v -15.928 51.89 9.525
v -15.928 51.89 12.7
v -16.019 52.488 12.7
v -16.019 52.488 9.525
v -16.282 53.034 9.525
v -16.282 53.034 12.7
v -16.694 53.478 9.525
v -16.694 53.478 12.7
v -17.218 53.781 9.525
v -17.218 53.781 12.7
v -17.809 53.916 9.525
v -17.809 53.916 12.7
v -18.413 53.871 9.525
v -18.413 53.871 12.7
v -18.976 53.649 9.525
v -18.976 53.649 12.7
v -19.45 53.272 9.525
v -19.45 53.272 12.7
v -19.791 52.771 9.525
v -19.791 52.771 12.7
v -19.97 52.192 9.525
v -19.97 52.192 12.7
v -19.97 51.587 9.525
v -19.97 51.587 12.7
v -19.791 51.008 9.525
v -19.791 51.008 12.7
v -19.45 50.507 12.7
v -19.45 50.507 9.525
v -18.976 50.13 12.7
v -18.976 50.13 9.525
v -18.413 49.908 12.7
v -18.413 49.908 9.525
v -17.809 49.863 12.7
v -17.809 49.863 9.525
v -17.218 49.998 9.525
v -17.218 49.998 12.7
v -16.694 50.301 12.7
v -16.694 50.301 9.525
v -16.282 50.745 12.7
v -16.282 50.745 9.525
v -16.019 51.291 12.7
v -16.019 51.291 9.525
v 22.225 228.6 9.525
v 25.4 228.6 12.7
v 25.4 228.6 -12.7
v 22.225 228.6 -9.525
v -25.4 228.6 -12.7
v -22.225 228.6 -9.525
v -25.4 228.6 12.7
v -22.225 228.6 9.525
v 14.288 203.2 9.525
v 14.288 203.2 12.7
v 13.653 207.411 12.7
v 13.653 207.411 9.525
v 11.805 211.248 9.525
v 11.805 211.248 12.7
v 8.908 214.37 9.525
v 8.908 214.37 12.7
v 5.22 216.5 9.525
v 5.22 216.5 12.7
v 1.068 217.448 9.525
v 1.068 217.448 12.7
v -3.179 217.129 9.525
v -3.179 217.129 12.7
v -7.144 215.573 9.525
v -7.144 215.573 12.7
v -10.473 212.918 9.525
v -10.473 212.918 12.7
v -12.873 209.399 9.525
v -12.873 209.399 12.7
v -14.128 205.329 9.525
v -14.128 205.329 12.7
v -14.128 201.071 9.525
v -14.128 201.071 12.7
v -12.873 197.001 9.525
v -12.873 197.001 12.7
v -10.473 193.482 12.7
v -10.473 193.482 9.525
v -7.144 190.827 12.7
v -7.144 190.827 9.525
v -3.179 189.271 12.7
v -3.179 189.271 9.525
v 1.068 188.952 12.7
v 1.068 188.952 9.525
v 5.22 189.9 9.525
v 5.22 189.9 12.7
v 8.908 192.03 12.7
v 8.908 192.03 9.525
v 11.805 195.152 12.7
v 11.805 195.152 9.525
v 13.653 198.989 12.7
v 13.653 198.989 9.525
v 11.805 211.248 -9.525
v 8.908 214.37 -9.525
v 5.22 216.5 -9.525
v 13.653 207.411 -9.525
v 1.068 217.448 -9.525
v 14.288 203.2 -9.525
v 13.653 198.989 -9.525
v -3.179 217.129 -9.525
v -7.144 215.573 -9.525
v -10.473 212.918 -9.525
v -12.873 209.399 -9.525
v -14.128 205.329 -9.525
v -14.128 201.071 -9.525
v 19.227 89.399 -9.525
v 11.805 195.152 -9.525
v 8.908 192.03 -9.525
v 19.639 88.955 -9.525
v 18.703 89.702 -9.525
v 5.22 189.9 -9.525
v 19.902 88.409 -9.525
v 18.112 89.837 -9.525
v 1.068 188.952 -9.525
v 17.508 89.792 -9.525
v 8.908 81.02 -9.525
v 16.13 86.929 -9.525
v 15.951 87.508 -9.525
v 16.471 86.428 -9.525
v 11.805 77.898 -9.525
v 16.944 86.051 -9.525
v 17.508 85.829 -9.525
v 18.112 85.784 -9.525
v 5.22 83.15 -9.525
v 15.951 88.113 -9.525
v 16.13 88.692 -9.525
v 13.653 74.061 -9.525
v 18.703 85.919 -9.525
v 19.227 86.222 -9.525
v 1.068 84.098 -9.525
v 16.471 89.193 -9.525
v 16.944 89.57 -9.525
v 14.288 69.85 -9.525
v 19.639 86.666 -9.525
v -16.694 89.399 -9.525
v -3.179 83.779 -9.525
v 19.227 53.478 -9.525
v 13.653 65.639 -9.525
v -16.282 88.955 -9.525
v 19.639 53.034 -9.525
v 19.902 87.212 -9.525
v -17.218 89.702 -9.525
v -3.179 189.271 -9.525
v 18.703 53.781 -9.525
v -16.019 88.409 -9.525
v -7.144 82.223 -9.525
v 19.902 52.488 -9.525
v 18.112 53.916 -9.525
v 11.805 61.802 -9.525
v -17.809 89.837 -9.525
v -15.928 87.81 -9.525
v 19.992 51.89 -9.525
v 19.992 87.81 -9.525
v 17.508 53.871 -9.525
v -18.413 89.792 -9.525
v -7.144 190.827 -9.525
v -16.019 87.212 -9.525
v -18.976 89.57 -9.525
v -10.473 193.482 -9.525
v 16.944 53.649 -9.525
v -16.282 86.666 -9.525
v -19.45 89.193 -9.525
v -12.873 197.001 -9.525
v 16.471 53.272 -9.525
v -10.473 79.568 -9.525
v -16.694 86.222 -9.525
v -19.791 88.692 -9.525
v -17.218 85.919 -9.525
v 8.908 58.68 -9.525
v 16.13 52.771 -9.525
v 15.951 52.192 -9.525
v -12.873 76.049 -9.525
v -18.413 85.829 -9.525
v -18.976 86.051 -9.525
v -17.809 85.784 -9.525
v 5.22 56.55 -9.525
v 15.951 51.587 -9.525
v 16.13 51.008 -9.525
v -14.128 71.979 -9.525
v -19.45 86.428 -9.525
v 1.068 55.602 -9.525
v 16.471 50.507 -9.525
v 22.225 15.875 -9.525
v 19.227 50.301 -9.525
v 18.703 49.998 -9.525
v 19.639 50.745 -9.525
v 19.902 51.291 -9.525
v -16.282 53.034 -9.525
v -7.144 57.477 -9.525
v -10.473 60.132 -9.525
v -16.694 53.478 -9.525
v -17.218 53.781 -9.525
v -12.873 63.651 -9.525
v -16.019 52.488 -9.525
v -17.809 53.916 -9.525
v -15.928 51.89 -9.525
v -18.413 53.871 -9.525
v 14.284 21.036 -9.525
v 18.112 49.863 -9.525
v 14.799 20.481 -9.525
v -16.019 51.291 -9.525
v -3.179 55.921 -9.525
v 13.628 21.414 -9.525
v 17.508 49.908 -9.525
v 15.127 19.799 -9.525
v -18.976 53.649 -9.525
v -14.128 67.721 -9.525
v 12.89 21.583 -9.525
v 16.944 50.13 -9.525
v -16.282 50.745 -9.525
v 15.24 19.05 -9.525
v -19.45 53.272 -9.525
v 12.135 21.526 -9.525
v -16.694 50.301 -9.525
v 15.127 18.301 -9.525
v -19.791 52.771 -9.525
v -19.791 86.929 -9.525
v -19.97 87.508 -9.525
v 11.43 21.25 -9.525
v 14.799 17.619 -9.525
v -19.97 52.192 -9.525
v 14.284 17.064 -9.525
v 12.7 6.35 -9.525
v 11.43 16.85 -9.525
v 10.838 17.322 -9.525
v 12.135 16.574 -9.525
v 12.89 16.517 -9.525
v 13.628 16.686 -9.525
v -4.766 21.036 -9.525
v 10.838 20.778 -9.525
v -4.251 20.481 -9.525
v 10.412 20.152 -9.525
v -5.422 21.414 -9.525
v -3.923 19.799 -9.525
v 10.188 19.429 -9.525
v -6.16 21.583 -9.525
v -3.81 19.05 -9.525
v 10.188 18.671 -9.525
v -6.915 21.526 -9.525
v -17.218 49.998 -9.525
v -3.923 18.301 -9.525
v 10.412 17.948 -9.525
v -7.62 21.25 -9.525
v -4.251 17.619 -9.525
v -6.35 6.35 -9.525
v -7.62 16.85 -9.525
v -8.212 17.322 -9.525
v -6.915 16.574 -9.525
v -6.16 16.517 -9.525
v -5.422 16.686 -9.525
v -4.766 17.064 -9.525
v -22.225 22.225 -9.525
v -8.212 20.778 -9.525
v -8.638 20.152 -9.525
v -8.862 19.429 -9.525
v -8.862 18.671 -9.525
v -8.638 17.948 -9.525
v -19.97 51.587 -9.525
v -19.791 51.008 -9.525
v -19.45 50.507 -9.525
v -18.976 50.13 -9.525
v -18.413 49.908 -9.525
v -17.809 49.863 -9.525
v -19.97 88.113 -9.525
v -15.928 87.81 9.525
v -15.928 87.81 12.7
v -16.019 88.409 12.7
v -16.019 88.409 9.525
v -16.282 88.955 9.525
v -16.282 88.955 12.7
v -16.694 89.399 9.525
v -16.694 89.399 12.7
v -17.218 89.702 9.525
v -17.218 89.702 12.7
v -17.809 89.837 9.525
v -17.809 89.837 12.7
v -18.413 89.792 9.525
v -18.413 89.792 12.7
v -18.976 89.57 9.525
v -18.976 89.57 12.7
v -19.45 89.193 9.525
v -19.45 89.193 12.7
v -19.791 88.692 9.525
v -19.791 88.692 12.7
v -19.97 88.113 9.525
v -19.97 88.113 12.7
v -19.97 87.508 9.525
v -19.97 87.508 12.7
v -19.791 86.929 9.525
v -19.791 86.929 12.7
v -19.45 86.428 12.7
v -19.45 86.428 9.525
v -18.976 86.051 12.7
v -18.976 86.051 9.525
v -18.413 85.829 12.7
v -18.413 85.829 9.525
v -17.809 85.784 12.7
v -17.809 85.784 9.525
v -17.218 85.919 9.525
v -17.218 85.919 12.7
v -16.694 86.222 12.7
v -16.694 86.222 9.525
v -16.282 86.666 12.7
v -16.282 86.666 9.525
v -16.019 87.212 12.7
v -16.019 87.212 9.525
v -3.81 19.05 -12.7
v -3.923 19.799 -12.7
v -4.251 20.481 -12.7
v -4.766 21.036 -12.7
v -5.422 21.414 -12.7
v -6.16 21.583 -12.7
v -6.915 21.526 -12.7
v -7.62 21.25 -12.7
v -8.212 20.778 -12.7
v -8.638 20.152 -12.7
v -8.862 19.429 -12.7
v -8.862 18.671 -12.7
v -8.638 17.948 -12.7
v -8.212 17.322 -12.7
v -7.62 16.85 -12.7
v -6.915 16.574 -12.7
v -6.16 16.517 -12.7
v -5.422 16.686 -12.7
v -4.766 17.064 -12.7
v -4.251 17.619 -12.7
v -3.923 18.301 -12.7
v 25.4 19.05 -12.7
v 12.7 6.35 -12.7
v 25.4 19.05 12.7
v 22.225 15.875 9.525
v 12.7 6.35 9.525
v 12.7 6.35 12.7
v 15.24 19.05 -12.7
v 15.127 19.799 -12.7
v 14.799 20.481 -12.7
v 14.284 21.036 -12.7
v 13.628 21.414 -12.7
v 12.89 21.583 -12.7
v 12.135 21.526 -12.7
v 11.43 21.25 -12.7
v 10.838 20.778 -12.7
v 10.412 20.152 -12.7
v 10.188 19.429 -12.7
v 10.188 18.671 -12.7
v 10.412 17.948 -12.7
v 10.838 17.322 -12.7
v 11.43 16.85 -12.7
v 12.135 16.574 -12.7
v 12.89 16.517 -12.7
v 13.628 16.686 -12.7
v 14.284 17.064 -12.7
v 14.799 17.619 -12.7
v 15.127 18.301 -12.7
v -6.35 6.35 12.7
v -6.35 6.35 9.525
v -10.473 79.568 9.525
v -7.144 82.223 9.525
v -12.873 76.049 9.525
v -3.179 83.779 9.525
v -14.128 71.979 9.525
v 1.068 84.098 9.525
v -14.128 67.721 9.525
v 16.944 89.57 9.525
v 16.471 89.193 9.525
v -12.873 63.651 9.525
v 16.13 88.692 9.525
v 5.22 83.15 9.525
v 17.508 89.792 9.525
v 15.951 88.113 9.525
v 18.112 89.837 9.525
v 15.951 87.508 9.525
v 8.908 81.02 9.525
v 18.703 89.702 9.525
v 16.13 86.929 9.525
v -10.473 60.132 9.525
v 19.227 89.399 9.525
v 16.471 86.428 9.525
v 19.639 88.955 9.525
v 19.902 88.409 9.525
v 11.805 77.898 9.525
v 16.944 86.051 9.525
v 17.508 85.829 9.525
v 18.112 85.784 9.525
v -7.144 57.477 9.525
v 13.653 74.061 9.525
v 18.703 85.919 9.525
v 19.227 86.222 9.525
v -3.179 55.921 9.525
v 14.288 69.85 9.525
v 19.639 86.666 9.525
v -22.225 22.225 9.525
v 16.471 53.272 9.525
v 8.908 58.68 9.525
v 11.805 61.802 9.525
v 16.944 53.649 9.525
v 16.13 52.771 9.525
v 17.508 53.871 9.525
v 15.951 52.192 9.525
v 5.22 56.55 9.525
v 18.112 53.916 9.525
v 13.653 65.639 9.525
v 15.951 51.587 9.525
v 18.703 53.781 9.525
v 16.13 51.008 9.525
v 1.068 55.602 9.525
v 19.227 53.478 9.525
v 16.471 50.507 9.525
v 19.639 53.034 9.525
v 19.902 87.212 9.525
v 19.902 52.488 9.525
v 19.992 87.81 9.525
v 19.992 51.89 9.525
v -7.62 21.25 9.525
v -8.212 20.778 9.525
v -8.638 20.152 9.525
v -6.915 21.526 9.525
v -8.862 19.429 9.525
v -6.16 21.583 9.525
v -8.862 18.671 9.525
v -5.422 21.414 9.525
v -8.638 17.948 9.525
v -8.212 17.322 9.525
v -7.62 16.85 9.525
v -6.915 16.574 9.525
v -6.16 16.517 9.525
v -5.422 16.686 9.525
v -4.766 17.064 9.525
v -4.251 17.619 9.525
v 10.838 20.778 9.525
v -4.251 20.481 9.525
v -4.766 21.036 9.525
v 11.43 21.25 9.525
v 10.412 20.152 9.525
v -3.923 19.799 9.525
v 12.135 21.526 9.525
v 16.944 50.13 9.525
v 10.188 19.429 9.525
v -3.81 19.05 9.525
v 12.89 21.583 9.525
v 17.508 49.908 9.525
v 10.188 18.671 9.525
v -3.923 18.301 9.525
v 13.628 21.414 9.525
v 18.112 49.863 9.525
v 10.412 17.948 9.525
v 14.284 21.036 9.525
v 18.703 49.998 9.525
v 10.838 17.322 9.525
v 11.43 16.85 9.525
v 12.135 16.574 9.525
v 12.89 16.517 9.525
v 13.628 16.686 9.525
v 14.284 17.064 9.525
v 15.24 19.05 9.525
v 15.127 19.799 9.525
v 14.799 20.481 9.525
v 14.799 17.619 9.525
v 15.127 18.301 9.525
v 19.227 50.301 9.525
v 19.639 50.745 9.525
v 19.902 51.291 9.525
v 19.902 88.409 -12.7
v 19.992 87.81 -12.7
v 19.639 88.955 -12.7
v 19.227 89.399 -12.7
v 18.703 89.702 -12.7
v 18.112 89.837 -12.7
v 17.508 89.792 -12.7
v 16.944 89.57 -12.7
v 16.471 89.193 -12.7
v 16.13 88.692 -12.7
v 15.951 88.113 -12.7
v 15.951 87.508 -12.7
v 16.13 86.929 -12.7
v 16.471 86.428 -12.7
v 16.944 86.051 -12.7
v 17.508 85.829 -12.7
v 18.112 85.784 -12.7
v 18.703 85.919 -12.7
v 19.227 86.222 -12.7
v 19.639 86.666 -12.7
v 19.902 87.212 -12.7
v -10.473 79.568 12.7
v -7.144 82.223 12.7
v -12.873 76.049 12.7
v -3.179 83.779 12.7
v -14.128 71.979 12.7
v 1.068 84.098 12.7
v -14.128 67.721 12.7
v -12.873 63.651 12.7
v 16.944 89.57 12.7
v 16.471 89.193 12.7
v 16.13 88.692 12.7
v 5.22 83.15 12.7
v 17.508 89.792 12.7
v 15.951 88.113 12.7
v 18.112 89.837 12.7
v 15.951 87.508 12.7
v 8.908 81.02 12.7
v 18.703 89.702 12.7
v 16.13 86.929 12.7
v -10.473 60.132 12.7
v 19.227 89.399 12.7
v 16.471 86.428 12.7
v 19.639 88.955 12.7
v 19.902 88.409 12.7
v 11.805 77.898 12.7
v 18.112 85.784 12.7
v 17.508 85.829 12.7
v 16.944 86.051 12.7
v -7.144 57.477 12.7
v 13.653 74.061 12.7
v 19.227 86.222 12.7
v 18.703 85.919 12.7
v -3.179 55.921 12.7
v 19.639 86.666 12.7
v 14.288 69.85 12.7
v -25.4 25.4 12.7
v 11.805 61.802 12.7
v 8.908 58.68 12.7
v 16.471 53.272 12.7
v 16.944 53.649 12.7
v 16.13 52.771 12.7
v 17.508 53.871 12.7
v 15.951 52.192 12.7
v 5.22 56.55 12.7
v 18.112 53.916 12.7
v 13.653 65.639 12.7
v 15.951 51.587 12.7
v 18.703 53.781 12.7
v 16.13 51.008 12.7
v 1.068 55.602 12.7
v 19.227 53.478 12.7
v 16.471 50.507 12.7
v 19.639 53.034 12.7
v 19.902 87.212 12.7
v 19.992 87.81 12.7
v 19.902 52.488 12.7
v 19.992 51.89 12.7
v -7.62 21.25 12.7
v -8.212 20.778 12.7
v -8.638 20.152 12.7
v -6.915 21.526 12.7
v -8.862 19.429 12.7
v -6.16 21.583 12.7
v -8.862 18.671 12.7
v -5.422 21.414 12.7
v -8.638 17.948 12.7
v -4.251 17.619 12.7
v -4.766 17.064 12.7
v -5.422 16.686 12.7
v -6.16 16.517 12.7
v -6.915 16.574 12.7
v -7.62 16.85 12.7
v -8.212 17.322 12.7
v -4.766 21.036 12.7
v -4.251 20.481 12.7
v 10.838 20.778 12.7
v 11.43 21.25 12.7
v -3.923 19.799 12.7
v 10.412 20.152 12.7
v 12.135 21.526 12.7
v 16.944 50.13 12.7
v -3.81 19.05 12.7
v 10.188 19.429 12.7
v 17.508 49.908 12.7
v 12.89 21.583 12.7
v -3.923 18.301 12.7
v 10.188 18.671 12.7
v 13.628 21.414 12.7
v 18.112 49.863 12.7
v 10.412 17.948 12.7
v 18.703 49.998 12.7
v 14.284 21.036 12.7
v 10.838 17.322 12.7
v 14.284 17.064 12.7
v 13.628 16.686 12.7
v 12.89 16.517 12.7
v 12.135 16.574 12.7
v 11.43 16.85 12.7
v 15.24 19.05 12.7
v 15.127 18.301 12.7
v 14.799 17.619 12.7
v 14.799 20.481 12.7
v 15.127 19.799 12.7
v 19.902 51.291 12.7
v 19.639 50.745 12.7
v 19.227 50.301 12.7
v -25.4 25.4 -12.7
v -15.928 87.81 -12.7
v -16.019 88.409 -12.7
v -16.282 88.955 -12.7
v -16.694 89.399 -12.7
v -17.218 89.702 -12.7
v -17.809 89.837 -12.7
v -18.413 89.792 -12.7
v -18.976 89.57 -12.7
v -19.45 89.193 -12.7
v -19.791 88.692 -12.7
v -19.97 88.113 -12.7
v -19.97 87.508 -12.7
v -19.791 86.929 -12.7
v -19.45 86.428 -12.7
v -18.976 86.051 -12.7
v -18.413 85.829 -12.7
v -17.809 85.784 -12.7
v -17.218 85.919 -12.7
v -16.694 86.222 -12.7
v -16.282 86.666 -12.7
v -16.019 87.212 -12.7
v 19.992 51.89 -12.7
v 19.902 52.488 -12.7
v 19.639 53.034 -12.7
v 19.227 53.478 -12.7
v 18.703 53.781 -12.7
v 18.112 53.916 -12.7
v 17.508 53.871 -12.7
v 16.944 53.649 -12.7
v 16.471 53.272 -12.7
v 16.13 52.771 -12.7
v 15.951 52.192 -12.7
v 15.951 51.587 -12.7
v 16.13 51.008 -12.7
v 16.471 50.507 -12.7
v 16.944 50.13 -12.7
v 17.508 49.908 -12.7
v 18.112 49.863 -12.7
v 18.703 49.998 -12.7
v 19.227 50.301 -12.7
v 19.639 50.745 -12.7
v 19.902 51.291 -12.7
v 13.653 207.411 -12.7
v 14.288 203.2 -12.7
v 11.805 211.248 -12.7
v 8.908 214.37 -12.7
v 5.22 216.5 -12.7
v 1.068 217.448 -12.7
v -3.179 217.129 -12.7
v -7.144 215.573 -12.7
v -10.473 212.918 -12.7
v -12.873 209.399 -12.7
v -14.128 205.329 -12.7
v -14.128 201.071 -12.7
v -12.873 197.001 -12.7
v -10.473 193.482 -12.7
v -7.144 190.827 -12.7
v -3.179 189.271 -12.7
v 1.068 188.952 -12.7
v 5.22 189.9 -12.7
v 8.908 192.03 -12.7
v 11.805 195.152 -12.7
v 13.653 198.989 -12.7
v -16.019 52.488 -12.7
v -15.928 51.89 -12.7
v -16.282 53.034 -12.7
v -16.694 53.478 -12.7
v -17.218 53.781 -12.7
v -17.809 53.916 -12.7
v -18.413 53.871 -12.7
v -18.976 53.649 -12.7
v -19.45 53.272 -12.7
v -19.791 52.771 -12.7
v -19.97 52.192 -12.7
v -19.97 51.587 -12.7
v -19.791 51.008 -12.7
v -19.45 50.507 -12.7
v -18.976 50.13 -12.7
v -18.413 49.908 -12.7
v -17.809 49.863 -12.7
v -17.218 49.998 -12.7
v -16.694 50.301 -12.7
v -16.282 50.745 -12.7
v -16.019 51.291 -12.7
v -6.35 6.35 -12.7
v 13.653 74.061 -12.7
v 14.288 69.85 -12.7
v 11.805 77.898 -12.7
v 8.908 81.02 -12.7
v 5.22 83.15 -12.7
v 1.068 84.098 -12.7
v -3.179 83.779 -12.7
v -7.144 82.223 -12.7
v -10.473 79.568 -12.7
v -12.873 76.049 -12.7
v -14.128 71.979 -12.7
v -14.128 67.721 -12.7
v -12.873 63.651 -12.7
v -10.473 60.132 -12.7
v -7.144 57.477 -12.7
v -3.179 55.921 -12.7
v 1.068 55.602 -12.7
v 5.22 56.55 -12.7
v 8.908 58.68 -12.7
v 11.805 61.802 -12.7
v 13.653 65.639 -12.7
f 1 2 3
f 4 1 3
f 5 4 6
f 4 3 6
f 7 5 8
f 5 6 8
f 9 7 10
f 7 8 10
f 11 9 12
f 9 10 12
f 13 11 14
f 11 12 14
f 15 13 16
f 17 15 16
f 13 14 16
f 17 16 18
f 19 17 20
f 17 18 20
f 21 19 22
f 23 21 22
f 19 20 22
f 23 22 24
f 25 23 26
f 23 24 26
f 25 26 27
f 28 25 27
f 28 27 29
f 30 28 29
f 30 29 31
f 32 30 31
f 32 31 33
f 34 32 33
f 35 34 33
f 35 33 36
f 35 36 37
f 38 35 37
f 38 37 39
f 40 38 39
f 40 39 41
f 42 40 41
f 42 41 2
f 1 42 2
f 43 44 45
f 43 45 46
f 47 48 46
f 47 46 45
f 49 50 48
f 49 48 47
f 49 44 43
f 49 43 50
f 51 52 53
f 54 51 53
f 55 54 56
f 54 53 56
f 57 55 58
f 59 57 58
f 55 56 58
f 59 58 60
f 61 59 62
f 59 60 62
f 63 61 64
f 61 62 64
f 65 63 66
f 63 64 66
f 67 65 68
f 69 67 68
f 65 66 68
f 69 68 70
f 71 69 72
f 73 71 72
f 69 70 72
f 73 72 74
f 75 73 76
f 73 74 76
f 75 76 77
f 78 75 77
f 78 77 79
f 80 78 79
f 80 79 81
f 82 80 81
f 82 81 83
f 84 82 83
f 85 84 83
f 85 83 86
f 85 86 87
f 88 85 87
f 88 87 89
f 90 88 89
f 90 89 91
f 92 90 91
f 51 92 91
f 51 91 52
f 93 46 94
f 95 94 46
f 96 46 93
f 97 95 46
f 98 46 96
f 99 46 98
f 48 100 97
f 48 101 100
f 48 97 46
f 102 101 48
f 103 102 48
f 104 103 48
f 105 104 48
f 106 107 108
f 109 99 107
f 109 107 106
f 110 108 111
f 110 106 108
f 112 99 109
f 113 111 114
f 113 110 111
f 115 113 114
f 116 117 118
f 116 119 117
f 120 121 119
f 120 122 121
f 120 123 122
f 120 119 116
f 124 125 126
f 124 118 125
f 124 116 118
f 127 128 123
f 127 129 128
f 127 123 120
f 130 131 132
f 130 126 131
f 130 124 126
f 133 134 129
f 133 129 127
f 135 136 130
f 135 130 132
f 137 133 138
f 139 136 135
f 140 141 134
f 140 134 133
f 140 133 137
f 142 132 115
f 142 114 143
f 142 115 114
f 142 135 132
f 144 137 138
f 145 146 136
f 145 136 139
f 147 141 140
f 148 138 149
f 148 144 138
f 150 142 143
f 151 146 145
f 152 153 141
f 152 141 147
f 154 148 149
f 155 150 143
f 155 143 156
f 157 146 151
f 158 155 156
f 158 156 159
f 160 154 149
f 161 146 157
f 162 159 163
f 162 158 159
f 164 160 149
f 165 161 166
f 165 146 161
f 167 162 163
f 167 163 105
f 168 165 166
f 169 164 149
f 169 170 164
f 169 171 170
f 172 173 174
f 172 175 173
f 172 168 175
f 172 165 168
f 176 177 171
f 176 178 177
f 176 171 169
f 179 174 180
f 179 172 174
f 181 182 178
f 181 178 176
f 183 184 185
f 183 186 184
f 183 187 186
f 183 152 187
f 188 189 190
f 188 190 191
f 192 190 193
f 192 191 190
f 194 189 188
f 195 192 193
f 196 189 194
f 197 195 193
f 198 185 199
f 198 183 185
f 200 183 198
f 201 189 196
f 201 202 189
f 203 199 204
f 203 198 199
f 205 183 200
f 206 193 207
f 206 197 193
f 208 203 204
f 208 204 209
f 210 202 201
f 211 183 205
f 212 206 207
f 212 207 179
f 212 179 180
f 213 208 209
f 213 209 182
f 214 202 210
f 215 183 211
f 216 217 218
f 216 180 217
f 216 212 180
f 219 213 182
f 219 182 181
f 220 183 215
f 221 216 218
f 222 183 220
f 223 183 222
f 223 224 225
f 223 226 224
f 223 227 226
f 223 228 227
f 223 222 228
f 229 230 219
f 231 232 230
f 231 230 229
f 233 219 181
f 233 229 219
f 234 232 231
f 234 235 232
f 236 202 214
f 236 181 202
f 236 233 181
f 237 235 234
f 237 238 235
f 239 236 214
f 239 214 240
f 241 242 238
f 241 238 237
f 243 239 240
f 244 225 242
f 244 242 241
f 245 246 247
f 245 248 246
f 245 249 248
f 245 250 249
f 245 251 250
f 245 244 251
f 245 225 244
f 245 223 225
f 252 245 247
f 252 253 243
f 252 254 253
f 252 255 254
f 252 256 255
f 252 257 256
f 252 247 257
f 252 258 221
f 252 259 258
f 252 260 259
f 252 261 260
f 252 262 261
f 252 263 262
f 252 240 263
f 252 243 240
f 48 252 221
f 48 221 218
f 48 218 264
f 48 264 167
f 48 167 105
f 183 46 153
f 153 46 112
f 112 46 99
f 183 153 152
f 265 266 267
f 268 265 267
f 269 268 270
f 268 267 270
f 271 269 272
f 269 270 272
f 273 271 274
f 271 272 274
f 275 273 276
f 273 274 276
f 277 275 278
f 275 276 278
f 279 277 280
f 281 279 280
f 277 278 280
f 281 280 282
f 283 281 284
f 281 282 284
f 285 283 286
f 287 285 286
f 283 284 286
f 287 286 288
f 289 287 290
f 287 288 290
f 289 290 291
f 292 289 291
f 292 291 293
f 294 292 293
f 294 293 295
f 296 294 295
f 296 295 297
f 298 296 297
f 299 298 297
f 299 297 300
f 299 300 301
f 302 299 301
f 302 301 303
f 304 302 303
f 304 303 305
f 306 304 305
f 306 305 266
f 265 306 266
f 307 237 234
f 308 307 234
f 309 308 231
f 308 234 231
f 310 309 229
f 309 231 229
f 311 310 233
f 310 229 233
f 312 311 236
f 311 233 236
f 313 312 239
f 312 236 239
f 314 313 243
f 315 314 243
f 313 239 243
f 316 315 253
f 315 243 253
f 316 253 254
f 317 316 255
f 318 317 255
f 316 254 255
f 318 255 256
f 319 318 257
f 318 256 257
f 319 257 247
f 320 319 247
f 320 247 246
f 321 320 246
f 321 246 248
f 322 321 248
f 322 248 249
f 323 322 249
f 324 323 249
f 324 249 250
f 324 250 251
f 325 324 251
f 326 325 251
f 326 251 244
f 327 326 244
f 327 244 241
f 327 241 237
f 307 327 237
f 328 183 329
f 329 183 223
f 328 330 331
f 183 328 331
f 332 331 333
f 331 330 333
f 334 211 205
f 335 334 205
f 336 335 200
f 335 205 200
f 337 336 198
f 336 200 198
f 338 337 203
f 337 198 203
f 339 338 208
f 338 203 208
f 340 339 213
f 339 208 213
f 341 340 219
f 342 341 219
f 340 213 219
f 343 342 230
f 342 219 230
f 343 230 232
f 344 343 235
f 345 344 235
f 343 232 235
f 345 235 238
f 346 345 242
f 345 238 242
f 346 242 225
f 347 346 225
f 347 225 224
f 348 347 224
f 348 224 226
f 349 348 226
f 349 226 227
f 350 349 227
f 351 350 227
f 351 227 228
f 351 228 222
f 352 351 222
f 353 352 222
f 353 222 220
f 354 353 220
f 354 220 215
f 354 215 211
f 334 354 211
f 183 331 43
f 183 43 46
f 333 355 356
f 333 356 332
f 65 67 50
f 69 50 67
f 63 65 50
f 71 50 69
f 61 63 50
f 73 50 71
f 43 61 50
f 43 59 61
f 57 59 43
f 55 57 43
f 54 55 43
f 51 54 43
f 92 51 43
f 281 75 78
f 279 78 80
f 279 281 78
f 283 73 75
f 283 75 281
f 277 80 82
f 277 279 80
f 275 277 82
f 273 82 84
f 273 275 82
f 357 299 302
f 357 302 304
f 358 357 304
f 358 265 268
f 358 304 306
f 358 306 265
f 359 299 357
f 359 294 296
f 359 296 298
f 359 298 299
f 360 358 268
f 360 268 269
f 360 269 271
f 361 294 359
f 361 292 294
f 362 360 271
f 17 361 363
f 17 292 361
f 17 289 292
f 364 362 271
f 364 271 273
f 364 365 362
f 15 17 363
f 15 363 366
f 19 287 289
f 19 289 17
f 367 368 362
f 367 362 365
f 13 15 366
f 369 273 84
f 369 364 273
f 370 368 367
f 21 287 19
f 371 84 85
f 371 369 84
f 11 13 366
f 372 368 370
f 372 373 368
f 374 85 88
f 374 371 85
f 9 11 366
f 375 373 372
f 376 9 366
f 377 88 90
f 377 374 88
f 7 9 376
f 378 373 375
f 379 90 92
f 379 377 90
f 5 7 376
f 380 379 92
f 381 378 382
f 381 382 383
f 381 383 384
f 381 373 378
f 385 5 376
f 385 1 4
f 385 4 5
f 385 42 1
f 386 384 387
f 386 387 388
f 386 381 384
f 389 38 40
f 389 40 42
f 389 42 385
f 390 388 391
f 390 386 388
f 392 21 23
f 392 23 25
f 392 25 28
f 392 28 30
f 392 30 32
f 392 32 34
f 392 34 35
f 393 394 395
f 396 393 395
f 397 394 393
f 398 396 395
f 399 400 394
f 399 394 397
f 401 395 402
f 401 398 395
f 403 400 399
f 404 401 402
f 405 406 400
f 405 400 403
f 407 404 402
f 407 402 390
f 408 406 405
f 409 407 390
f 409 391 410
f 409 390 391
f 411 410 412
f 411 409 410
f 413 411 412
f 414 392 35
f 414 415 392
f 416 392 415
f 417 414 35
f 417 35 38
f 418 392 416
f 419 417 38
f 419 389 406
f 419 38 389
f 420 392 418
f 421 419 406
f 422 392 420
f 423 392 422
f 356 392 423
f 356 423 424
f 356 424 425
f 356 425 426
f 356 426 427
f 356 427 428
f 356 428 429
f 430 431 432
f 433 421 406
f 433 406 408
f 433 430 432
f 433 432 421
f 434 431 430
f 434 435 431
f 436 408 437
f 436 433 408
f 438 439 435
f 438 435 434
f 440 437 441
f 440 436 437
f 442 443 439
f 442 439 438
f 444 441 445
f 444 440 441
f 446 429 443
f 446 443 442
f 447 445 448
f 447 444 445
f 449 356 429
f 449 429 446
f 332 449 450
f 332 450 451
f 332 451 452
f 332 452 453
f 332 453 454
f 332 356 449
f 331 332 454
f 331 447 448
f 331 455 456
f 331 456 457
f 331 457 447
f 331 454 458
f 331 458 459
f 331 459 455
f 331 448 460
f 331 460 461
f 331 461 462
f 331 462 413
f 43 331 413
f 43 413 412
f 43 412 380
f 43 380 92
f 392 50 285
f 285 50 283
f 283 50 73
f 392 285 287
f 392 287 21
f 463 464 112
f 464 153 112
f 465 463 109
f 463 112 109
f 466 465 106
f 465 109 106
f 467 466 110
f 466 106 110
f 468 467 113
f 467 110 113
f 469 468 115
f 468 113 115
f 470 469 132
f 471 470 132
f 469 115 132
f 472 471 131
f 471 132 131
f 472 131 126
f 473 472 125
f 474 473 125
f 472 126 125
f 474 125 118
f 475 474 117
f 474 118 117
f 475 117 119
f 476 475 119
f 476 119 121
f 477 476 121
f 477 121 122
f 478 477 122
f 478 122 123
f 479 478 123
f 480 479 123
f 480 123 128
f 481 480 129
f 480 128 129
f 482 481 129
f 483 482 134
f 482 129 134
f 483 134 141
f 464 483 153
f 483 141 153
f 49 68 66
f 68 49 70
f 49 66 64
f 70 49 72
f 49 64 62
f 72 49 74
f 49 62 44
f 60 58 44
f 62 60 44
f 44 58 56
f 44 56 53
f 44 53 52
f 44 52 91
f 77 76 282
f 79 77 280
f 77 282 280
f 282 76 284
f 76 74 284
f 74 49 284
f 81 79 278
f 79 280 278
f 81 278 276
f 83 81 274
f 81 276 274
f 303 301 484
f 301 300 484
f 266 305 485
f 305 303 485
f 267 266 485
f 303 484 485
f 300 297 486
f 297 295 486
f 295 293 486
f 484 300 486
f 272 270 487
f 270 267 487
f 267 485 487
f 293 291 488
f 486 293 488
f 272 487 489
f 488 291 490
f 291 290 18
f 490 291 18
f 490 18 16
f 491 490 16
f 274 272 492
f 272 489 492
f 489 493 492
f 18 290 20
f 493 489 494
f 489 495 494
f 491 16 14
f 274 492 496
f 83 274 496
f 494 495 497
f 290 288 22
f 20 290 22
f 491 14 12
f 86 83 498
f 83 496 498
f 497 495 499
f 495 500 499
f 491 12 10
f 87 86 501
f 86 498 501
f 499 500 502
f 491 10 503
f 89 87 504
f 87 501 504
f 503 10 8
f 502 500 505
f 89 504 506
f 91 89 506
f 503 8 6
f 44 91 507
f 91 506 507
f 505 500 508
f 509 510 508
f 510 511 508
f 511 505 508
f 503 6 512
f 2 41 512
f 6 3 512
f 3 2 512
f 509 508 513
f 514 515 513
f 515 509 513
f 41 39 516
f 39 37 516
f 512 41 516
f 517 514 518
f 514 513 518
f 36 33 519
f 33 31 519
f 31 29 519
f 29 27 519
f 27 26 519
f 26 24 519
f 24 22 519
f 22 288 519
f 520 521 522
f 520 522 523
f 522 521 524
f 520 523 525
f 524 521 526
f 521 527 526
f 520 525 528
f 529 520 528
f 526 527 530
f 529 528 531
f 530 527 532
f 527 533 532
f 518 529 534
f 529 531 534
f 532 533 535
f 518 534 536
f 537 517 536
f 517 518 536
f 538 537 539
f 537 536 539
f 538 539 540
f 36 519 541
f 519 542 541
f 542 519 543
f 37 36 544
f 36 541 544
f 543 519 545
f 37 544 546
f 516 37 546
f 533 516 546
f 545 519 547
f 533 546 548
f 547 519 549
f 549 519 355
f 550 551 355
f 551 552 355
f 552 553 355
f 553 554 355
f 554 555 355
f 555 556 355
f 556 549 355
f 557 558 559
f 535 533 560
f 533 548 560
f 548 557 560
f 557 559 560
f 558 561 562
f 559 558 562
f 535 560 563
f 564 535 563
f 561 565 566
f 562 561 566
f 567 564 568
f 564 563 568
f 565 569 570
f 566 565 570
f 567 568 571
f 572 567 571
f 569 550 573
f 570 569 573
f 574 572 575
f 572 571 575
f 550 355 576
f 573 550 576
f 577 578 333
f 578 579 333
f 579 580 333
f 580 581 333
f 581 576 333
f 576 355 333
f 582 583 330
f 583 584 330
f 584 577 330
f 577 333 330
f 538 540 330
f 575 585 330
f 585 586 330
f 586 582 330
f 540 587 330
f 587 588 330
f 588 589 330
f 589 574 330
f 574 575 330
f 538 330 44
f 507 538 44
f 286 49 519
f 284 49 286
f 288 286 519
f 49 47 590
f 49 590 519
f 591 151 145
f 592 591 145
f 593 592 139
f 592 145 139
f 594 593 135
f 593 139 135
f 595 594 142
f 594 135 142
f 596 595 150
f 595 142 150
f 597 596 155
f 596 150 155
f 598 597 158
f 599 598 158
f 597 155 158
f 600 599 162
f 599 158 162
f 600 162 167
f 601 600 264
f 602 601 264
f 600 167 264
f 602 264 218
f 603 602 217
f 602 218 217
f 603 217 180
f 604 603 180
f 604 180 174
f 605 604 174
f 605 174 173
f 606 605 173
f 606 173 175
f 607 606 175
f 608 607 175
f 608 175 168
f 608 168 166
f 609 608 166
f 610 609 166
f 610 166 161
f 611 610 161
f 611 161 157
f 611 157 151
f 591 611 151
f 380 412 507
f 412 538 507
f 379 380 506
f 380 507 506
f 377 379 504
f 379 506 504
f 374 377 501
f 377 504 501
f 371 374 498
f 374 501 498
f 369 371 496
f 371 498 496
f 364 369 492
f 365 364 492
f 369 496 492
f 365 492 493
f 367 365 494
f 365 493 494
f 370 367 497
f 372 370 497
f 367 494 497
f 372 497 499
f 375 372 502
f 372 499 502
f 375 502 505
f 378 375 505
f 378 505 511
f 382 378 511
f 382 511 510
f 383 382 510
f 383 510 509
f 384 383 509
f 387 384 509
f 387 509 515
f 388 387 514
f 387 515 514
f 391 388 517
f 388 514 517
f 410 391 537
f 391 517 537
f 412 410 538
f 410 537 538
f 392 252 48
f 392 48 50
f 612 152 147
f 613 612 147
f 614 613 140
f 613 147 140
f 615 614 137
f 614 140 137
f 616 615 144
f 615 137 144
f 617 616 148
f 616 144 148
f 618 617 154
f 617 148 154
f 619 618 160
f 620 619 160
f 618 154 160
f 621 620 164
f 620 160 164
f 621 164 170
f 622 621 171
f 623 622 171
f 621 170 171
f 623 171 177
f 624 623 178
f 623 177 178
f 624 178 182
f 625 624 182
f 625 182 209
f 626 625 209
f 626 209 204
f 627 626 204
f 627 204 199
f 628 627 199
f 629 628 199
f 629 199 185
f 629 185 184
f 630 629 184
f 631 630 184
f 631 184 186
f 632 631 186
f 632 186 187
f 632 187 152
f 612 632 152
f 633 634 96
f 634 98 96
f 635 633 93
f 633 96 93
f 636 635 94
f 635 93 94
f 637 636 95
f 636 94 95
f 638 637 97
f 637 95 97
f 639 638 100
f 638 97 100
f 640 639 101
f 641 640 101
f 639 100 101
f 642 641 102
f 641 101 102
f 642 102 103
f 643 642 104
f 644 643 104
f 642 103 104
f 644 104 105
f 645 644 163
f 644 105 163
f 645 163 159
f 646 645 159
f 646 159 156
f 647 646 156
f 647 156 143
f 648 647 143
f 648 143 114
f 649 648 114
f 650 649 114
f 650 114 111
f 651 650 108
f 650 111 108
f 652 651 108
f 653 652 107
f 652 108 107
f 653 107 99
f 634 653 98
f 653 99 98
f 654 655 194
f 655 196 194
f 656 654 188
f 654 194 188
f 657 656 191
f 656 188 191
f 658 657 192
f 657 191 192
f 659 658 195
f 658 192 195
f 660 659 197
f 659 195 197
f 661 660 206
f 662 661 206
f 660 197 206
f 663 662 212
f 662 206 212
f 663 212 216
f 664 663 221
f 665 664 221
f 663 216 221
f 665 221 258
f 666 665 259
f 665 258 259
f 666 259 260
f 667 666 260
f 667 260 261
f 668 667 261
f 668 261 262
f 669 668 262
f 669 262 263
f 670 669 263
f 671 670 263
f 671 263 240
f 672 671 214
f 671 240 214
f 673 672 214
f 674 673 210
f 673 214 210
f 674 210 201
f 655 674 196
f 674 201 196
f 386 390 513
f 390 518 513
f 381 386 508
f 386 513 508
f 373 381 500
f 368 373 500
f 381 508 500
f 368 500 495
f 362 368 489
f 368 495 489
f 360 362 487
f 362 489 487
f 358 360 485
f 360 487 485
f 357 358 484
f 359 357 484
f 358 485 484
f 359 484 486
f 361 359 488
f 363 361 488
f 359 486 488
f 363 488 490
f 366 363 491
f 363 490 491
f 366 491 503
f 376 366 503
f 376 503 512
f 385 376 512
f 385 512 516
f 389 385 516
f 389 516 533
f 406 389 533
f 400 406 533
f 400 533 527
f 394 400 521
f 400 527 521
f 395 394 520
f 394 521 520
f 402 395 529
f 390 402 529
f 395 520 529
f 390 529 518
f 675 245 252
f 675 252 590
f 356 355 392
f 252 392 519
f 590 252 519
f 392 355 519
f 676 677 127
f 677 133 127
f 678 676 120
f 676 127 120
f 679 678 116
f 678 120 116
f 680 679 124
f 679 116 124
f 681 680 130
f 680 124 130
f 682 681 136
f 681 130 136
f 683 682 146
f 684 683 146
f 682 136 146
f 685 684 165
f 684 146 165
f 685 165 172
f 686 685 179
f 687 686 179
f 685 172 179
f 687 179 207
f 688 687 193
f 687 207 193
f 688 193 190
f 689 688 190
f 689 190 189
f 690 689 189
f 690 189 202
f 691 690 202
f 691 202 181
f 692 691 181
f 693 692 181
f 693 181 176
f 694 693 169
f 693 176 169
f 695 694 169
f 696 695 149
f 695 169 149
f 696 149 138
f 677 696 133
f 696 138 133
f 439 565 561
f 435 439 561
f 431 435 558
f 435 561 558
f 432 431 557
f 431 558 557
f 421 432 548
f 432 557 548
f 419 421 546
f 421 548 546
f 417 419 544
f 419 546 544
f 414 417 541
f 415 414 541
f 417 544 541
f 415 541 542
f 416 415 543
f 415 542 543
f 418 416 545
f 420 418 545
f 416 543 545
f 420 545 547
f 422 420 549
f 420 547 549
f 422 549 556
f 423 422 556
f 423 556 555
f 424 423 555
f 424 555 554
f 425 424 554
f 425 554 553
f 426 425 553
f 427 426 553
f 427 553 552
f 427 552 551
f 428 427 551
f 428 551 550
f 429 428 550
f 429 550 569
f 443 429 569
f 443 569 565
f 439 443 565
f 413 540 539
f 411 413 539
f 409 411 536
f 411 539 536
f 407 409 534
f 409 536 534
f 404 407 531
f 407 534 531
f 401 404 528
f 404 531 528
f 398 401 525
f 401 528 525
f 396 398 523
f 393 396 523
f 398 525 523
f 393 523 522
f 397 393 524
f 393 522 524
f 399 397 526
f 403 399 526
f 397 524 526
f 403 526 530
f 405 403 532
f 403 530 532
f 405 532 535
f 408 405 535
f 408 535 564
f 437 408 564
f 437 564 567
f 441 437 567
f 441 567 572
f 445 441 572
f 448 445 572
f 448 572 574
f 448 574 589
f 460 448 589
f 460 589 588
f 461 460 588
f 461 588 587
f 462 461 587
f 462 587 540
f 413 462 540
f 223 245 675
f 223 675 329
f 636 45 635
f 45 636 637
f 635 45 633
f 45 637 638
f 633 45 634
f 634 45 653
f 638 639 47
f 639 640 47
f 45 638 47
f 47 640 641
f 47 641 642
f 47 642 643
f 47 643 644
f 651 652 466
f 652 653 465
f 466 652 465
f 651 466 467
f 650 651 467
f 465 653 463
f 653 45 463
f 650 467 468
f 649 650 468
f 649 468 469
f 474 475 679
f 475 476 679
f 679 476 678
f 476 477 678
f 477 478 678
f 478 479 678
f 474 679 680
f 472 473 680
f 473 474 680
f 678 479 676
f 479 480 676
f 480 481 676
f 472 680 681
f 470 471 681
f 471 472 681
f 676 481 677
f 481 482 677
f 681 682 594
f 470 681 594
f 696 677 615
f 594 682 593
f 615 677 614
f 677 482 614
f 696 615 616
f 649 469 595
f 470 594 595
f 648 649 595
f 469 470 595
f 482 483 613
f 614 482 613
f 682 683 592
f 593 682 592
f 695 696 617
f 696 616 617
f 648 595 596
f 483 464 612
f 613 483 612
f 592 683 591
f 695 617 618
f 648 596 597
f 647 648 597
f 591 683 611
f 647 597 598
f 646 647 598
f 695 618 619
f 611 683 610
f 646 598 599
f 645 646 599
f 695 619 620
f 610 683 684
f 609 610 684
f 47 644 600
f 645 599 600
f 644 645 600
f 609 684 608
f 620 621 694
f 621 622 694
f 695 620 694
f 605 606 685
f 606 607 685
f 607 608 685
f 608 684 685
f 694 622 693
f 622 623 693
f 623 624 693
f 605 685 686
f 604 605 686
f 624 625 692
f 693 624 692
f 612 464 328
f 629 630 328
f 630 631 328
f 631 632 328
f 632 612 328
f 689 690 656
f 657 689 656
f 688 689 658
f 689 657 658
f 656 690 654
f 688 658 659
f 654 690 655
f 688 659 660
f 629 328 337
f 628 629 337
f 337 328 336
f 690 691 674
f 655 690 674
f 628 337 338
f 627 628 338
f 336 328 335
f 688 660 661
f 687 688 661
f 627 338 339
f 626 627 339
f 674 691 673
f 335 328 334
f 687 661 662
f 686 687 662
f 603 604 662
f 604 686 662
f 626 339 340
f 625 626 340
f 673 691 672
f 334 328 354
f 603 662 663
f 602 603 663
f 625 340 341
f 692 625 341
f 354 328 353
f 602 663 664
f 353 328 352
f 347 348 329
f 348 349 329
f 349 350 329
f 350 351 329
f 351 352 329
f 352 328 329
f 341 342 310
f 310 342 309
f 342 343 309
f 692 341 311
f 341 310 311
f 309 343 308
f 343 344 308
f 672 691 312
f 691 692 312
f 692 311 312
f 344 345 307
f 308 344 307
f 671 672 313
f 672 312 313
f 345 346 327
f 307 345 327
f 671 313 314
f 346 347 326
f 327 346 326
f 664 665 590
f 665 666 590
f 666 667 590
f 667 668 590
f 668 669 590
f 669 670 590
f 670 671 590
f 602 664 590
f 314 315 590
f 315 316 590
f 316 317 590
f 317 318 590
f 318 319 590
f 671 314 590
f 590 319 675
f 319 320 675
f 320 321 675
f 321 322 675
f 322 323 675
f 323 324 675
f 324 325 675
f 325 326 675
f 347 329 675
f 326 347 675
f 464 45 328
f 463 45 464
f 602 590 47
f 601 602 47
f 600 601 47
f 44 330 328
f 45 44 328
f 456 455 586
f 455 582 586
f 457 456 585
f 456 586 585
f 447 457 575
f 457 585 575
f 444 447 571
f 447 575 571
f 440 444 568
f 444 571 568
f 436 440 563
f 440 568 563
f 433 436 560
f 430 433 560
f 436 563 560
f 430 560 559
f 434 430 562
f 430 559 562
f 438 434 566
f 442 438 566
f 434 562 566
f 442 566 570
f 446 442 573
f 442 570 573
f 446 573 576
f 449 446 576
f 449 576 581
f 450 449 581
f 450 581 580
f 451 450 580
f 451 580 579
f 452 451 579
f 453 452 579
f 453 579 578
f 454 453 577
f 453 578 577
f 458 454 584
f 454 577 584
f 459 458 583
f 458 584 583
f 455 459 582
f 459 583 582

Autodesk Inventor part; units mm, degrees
ref_plane "YZ Plane" through (0, 0, 0) normal (1, 0, 0) x (0, 1, 0)
ref_plane "XZ Plane" through (0, 0, 0) normal (0, 1, 0) x (-1, 0, 0)
ref_plane "XY Plane" through (0, 0, 0) normal (0, 0, 1) x (1, 0, 0)
sketch "Sketch1" plane through (0, 0, 0) normal (0, 1, 0) x (-1, 0, 0)
  line L0 (25.4, 12.7) -> (-25.4, 12.7)
  line L1 (-25.4, 12.7) -> (-25.4, -12.7)
  line L2 (-25.4, -12.7) -> (25.4, -12.7)
  line L3 (25.4, -12.7) -> (25.4, 12.7)
  line L4 (25.4, 12.7) -> (-25.4, -12.7) construction
  line L5 (-25.4, 12.7) -> (25.4, -12.7) construction
  line L6 (22.225, 9.525) -> (-22.225, 9.525)
  line L7 (-22.225, 9.525) -> (-22.225, -9.525)
  line L8 (-22.225, -9.525) -> (22.225, -9.525)
  line L9 (22.225, -9.525) -> (22.225, 9.525)
  line L10 (22.225, 9.525) -> (-22.225, -9.525) construction
  line L11 (-22.225, 9.525) -> (22.225, -9.525) construction
  point P0 (0, 0)
  dimension "d0" = 50.8
  dimension "d1" = 25.4
  dimension "d2" = 44.45
  dimension "d3" = 19.05
extrude "Extrusion1" add sketch "Sketch1" along normal blind 228.6
sketch "Sketch2" plane through (-25.4, 0, 12.7) normal (0, 0, 1) x (1, 0, 0)
  line L0 (50.8, 0) -> (50.8, 228.6) projected
  line L1 (0, 228.6) -> (50.8, 228.6) projected
  line L2 (0, 0) -> (0, 228.6) projected
  line L3 (25.4, 228.6) -> (25.4, 203.2)
  circle A0 centre (25.4, 203.2) radius 6.35
  line L4 (25.4, 203.2) -> (25.4, 25.4)
  line L5 (25.4, 203.2) -> (203.2, 203.2) construction
  line L6 (25.4, 25.4) -> (50.8, 25.4)
  line L7 (50.8, 25.4) -> (0, 25.4)
  line L8 (25.4, 25.4) -> (25.4, 19.05)
  line L9 (25.4, 25.4) -> (31.75, 25.4) construction
  line L10 (25.4, 19.05) -> (50.8, 19.05)
  line L11 (25.4, 19.05) -> (0, 19.05)
  line L12 (25.4, 19.05) -> (38.1, 19.05)
  line L13 (38.1, 19.05) -> (19.05, 19.05)
  circle A1 centre (38.1, 19.05) radius 2.54
  circle A2 centre (19.05, 19.05) radius 2.54
  point P0 (25.4, 0)
  dimension "d6" = 25.4
  dimension "d7" = 12.7
  dimension "d8" = 177.8
  dimension "d9" = 90
  dimension "d10" = 6.35
  dimension "d11" = 90
  dimension "d12" = 12.7
  dimension "d13" = 19.05
  dimension "d14" = 0
  dimension "d15" = 5.08
  dimension "d16" = 5.08
extrude "Extrusion2" cut sketch "Sketch2" against normal blind 228.6 contours A1 L10 | L10 A1 | L4 L3 A0 | A0 L3 L4 | A2 L11 | L11 A2
sketch "Sketch3" plane through (0, 0, 0) normal (0, -1, 0) x (1, 0, 0)
  line L0 (-22.225, -9.525) -> (-22.225, 9.525) projected
  line L1 (-22.225, 9.525) -> (22.225, 9.525) projected
  line L2 (22.225, 9.525) -> (22.225, -9.525) projected
  line L3 (22.225, -9.525) -> (-22.225, -9.525) projected
  line L4 (-25.4, 12.7) -> (25.4, 12.7) projected
  line L5 (-25.4, -12.7) -> (-25.4, 12.7) projected
  line L6 (25.4, -12.7) -> (-25.4, -12.7) projected
  line L7 (25.4, 12.7) -> (25.4, -12.7) projected
  point P0 (0, 0)
extrude "Extrusion3" cut sketch "Sketch3" against normal blind 6.35
sketch "Sketch4" plane through (-25.4, 228.6, 12.7) normal (0, 0, 1) x (1, 0, 0)
  line L0 (0, -222.25) -> (50.8, -222.25) projected
  line L1 (50.8, -222.25) -> (50.8, 0) projected
  line L2 (0, -222.25) -> (0, 0) projected
  line L3 (0, -209.55) -> (12.7, -222.25)
  line L4 (50.8, -209.55) -> (38.1, -222.25)
  point P0 (25.4, -228.6)
extrude "Extrusion4" cut sketch "Sketch4" against normal blind 635
sketch "Sketch5" plane through (-25.4, 228.6, 12.7) normal (0, 0, 1) x (1, 0, 0)
  line L0 (0, -209.55) -> (12.7, -222.25) projected
  line L1 (12.7, -222.25) -> (38.1, -222.25) projected
  line L2 (38.1, -222.25) -> (50.8, -209.55) projected
  line L3 (0, -209.55) -> (0, 0) projected
  line L4 (19.05, -222.25) -> (0, -203.2)
  point P0 (25.4, -228.6)
extrude "Extrusion5" cut sketch "Sketch5" against normal blind 635
sketch "Sketch6" plane through (-25.4, 228.6, 12.7) normal (0, 0, 1) x (1, 0, 0)
  line L0 (19.05, -222.25) -> (38.1, -222.25) projected
  line L1 (38.1, -222.25) -> (50.8, -209.55) projected
  line L2 (0, -203.2) -> (0, 0) projected
  line L3 (25.4, -222.25) -> (25.4, -158.75)
  line L4 (25.4, -222.25) -> (88.9, -222.25) construction
  circle A0 centre (25.4, -158.75) radius 9.525
  line L5 (25.4, -158.75) -> (43.3605, -140.7895)
  line L6 (25.4, -158.75) -> (50.8, -158.75) construction
  line L7 (43.3605, -140.7895) -> (7.4395, -176.7105)
  line L8 (7.4395, -176.7105) -> (43.3605, -176.7105)
  line L9 (43.3605, -176.7105) -> (43.3605, -140.7895)
  line L10 (43.3605, -140.7895) -> (7.4395, -140.7895)
  line L11 (7.4395, -140.7895) -> (7.4395, -176.7105)
  circle A1 centre (43.3605, -140.7895) radius 2.032
  circle A2 centre (7.4395, -140.7895) radius 2.032
  circle A3 centre (7.4395, -176.7105) radius 2.032
  circle A4 centre (43.3605, -176.7105) radius 2.032
  point P0 (25.4, -228.6)
  dimension "d25" = 63.5
  dimension "d26" = 90
  dimension "d27" = 19.05
  dimension "d28" = 25.4
  dimension "d29" = 45
  dimension "d30" = 50.8
  dimension "d31" = 4.064
  dimension "d32" = 4.064
  dimension "d33" = 4.064
  dimension "d34" = 4.064
extrude "Extrusion6" cut sketch "Sketch6" against normal blind 635 contours A0 L7 L3 | L3 L5 A0 | A3 L11 L8 | L8 L7 A3 | A4 L9 L8 | L8 L9 A4 | L7 A0 L5 | L11 A3 L7 | A2 L10 L11 | L11 L10 A2 | A1 L5 L9 | L9 L10 A1 | A1 L10 L5
sketch "Sketch7" plane through (-25.4, 228.6, 12.7) normal (0, 0, 1) x (1, 0, 0)
  circle A0 centre (25.4, -25.4) radius 6.35 projected
  circle A1 centre (25.4, -25.4) radius 14.2875
  point P0 (25.4, -228.6)
  dimension "d37" = 28.575
extrude "Extrusion7" cut sketch "Sketch7" against normal blind 635
sketch "Sketch8" plane through (-25.4, 228.6, 12.7) normal (0, 0, 1) x (1, 0, 0)
  circle A0 centre (25.4, -158.75) radius 9.525 projected
  circle A1 centre (25.4, -158.75) radius 14.2875
  point P0 (25.4, -228.6)
  dimension "d40" = 28.575
extrude "Extrusion8" cut sketch "Sketch8" against normal blind 25.4
properties part number "SuperStructure"
